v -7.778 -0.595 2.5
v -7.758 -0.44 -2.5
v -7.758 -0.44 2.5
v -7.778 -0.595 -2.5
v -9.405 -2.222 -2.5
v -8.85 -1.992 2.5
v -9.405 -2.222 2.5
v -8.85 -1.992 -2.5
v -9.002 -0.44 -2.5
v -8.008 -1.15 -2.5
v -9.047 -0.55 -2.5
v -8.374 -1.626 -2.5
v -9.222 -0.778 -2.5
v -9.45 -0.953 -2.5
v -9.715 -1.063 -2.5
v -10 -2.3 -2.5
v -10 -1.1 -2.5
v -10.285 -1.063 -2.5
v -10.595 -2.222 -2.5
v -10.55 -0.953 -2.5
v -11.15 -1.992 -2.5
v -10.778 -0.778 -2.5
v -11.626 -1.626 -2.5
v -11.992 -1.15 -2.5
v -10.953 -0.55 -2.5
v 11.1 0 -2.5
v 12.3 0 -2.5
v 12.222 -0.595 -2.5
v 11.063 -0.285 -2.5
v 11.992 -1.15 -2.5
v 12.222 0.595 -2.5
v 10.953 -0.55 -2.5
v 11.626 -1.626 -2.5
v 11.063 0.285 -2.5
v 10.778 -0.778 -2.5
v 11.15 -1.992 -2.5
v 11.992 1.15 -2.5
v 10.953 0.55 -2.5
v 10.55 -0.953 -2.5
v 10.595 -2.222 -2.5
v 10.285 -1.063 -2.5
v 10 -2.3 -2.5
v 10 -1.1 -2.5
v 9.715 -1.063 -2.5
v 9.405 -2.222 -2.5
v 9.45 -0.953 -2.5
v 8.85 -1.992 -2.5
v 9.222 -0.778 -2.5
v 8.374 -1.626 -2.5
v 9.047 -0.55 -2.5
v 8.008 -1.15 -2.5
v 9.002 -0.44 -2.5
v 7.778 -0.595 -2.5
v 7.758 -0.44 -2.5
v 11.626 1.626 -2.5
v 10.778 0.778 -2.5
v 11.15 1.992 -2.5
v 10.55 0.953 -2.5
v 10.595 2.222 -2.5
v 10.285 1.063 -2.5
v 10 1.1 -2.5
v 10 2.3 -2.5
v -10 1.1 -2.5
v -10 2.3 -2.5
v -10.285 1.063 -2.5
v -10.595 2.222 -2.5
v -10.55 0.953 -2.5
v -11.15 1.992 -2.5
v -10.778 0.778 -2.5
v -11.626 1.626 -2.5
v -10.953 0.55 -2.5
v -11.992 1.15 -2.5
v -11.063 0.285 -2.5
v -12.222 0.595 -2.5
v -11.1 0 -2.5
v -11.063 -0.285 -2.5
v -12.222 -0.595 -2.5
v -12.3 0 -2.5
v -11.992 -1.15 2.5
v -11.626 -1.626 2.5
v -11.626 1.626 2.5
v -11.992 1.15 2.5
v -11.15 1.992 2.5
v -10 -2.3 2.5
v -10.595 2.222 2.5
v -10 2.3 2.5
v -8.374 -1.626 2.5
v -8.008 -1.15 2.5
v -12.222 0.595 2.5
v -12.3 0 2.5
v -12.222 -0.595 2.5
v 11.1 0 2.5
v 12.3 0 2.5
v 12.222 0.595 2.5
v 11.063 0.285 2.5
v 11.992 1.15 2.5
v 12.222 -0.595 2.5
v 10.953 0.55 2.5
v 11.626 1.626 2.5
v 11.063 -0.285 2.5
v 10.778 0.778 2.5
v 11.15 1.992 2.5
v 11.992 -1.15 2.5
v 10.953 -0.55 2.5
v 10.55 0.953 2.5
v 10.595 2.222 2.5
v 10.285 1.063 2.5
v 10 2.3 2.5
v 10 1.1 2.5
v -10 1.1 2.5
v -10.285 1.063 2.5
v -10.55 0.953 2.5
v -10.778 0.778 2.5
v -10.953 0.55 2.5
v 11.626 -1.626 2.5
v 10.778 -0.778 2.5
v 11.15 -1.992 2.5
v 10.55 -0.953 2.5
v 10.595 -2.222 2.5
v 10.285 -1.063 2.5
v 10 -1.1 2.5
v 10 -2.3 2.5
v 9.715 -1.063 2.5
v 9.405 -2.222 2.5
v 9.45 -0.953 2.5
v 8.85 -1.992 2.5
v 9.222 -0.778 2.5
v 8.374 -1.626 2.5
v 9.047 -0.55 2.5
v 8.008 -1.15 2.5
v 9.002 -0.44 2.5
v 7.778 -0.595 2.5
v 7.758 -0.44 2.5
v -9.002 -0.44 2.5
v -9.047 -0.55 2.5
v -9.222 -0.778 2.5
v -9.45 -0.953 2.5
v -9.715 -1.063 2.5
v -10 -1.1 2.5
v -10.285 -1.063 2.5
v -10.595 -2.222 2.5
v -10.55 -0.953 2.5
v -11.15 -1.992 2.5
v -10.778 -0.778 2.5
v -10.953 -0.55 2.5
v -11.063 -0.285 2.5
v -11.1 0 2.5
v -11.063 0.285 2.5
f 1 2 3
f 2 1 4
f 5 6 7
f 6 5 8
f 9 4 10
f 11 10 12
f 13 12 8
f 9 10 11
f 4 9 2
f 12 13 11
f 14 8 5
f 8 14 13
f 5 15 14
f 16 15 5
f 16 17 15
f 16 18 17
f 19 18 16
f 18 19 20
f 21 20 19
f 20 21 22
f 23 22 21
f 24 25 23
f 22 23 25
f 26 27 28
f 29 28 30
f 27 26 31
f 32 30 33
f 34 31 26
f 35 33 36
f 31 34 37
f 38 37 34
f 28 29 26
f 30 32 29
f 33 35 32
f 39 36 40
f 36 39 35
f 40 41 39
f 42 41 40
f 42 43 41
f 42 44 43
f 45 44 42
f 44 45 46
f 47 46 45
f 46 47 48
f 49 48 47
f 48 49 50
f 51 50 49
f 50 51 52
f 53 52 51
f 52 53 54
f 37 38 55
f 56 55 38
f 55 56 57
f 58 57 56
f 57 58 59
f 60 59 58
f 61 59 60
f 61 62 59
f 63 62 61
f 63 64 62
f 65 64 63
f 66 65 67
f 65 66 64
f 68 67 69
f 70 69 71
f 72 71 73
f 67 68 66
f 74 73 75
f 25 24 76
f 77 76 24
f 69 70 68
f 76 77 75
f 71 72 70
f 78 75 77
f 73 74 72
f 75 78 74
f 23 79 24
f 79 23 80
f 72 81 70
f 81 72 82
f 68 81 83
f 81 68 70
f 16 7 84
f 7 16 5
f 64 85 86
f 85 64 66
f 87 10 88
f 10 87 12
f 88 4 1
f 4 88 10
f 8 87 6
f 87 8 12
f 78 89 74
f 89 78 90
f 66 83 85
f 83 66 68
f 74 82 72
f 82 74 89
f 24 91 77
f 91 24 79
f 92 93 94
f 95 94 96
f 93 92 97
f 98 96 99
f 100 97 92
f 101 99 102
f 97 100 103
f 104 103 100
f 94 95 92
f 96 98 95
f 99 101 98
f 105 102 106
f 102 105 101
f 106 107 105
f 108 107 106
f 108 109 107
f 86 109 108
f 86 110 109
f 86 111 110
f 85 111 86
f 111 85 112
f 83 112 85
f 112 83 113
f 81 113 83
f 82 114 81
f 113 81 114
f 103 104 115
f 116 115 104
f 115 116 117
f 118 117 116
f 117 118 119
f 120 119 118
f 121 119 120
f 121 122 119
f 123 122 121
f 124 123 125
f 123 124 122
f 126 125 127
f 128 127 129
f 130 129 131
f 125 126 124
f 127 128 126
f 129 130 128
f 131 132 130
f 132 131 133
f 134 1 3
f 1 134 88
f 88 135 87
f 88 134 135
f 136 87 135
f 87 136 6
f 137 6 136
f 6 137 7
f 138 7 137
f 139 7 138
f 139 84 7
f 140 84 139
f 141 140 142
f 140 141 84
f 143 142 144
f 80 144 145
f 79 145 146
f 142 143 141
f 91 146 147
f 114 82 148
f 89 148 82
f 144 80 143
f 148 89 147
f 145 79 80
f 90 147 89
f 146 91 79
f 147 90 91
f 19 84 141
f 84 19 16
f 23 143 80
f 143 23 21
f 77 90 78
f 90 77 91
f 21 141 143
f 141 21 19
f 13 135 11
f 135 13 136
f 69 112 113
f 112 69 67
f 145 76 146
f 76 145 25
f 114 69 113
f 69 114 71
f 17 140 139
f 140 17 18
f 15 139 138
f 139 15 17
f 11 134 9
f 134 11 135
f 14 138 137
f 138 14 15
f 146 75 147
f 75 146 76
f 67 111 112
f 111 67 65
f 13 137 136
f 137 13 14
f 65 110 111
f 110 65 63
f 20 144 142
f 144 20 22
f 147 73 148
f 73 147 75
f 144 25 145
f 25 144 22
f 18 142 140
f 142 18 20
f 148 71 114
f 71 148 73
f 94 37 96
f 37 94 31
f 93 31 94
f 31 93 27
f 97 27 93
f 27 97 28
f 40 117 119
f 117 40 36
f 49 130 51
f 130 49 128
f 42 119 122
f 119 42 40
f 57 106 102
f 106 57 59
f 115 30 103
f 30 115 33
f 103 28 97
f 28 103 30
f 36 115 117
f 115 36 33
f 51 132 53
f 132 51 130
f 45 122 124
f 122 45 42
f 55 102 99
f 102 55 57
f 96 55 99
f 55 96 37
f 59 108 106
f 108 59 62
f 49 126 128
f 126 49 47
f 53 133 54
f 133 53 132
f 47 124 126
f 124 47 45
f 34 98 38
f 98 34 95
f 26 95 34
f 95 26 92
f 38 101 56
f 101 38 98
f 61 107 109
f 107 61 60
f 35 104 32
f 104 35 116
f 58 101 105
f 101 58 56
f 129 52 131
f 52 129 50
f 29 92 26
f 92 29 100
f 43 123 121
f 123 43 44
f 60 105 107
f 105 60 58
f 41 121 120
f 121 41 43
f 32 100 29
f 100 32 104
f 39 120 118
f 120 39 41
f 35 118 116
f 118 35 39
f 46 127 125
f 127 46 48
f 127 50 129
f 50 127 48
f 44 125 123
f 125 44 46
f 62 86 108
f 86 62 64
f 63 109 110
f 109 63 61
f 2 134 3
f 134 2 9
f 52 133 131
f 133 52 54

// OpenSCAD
wire_diameter = 2.2; //mm
separation = 20; //mm
height = 5; //mm
thickness = 1.2; //mm
$fn=24;

opening=0.7*wire_diameter;

difference() {
  union() {
    translate([-0.5 * separation, 0, 0]) {
      difference() {
        cylinder(d=2*thickness+wire_diameter,h = height, center = true);
        cylinder(d=wire_diameter,h = height + 0.1, center = true);
      }
    }
    translate([0.5 * separation, 0, 0]) {
      difference() {
        cylinder(d=2*thickness+wire_diameter,h = height, center = true);
        cylinder(d=wire_diameter,h = height + 0.1, center = true);
      }
    }
    translate([0,(wire_diameter+thickness)/2,0]) {
      cube([separation, thickness, height], center = true);
    }
  }
  translate([0,(wire_diameter-opening)/2,0]) {
    cube([separation, opening, height+0.1], center = true);
  }
}
